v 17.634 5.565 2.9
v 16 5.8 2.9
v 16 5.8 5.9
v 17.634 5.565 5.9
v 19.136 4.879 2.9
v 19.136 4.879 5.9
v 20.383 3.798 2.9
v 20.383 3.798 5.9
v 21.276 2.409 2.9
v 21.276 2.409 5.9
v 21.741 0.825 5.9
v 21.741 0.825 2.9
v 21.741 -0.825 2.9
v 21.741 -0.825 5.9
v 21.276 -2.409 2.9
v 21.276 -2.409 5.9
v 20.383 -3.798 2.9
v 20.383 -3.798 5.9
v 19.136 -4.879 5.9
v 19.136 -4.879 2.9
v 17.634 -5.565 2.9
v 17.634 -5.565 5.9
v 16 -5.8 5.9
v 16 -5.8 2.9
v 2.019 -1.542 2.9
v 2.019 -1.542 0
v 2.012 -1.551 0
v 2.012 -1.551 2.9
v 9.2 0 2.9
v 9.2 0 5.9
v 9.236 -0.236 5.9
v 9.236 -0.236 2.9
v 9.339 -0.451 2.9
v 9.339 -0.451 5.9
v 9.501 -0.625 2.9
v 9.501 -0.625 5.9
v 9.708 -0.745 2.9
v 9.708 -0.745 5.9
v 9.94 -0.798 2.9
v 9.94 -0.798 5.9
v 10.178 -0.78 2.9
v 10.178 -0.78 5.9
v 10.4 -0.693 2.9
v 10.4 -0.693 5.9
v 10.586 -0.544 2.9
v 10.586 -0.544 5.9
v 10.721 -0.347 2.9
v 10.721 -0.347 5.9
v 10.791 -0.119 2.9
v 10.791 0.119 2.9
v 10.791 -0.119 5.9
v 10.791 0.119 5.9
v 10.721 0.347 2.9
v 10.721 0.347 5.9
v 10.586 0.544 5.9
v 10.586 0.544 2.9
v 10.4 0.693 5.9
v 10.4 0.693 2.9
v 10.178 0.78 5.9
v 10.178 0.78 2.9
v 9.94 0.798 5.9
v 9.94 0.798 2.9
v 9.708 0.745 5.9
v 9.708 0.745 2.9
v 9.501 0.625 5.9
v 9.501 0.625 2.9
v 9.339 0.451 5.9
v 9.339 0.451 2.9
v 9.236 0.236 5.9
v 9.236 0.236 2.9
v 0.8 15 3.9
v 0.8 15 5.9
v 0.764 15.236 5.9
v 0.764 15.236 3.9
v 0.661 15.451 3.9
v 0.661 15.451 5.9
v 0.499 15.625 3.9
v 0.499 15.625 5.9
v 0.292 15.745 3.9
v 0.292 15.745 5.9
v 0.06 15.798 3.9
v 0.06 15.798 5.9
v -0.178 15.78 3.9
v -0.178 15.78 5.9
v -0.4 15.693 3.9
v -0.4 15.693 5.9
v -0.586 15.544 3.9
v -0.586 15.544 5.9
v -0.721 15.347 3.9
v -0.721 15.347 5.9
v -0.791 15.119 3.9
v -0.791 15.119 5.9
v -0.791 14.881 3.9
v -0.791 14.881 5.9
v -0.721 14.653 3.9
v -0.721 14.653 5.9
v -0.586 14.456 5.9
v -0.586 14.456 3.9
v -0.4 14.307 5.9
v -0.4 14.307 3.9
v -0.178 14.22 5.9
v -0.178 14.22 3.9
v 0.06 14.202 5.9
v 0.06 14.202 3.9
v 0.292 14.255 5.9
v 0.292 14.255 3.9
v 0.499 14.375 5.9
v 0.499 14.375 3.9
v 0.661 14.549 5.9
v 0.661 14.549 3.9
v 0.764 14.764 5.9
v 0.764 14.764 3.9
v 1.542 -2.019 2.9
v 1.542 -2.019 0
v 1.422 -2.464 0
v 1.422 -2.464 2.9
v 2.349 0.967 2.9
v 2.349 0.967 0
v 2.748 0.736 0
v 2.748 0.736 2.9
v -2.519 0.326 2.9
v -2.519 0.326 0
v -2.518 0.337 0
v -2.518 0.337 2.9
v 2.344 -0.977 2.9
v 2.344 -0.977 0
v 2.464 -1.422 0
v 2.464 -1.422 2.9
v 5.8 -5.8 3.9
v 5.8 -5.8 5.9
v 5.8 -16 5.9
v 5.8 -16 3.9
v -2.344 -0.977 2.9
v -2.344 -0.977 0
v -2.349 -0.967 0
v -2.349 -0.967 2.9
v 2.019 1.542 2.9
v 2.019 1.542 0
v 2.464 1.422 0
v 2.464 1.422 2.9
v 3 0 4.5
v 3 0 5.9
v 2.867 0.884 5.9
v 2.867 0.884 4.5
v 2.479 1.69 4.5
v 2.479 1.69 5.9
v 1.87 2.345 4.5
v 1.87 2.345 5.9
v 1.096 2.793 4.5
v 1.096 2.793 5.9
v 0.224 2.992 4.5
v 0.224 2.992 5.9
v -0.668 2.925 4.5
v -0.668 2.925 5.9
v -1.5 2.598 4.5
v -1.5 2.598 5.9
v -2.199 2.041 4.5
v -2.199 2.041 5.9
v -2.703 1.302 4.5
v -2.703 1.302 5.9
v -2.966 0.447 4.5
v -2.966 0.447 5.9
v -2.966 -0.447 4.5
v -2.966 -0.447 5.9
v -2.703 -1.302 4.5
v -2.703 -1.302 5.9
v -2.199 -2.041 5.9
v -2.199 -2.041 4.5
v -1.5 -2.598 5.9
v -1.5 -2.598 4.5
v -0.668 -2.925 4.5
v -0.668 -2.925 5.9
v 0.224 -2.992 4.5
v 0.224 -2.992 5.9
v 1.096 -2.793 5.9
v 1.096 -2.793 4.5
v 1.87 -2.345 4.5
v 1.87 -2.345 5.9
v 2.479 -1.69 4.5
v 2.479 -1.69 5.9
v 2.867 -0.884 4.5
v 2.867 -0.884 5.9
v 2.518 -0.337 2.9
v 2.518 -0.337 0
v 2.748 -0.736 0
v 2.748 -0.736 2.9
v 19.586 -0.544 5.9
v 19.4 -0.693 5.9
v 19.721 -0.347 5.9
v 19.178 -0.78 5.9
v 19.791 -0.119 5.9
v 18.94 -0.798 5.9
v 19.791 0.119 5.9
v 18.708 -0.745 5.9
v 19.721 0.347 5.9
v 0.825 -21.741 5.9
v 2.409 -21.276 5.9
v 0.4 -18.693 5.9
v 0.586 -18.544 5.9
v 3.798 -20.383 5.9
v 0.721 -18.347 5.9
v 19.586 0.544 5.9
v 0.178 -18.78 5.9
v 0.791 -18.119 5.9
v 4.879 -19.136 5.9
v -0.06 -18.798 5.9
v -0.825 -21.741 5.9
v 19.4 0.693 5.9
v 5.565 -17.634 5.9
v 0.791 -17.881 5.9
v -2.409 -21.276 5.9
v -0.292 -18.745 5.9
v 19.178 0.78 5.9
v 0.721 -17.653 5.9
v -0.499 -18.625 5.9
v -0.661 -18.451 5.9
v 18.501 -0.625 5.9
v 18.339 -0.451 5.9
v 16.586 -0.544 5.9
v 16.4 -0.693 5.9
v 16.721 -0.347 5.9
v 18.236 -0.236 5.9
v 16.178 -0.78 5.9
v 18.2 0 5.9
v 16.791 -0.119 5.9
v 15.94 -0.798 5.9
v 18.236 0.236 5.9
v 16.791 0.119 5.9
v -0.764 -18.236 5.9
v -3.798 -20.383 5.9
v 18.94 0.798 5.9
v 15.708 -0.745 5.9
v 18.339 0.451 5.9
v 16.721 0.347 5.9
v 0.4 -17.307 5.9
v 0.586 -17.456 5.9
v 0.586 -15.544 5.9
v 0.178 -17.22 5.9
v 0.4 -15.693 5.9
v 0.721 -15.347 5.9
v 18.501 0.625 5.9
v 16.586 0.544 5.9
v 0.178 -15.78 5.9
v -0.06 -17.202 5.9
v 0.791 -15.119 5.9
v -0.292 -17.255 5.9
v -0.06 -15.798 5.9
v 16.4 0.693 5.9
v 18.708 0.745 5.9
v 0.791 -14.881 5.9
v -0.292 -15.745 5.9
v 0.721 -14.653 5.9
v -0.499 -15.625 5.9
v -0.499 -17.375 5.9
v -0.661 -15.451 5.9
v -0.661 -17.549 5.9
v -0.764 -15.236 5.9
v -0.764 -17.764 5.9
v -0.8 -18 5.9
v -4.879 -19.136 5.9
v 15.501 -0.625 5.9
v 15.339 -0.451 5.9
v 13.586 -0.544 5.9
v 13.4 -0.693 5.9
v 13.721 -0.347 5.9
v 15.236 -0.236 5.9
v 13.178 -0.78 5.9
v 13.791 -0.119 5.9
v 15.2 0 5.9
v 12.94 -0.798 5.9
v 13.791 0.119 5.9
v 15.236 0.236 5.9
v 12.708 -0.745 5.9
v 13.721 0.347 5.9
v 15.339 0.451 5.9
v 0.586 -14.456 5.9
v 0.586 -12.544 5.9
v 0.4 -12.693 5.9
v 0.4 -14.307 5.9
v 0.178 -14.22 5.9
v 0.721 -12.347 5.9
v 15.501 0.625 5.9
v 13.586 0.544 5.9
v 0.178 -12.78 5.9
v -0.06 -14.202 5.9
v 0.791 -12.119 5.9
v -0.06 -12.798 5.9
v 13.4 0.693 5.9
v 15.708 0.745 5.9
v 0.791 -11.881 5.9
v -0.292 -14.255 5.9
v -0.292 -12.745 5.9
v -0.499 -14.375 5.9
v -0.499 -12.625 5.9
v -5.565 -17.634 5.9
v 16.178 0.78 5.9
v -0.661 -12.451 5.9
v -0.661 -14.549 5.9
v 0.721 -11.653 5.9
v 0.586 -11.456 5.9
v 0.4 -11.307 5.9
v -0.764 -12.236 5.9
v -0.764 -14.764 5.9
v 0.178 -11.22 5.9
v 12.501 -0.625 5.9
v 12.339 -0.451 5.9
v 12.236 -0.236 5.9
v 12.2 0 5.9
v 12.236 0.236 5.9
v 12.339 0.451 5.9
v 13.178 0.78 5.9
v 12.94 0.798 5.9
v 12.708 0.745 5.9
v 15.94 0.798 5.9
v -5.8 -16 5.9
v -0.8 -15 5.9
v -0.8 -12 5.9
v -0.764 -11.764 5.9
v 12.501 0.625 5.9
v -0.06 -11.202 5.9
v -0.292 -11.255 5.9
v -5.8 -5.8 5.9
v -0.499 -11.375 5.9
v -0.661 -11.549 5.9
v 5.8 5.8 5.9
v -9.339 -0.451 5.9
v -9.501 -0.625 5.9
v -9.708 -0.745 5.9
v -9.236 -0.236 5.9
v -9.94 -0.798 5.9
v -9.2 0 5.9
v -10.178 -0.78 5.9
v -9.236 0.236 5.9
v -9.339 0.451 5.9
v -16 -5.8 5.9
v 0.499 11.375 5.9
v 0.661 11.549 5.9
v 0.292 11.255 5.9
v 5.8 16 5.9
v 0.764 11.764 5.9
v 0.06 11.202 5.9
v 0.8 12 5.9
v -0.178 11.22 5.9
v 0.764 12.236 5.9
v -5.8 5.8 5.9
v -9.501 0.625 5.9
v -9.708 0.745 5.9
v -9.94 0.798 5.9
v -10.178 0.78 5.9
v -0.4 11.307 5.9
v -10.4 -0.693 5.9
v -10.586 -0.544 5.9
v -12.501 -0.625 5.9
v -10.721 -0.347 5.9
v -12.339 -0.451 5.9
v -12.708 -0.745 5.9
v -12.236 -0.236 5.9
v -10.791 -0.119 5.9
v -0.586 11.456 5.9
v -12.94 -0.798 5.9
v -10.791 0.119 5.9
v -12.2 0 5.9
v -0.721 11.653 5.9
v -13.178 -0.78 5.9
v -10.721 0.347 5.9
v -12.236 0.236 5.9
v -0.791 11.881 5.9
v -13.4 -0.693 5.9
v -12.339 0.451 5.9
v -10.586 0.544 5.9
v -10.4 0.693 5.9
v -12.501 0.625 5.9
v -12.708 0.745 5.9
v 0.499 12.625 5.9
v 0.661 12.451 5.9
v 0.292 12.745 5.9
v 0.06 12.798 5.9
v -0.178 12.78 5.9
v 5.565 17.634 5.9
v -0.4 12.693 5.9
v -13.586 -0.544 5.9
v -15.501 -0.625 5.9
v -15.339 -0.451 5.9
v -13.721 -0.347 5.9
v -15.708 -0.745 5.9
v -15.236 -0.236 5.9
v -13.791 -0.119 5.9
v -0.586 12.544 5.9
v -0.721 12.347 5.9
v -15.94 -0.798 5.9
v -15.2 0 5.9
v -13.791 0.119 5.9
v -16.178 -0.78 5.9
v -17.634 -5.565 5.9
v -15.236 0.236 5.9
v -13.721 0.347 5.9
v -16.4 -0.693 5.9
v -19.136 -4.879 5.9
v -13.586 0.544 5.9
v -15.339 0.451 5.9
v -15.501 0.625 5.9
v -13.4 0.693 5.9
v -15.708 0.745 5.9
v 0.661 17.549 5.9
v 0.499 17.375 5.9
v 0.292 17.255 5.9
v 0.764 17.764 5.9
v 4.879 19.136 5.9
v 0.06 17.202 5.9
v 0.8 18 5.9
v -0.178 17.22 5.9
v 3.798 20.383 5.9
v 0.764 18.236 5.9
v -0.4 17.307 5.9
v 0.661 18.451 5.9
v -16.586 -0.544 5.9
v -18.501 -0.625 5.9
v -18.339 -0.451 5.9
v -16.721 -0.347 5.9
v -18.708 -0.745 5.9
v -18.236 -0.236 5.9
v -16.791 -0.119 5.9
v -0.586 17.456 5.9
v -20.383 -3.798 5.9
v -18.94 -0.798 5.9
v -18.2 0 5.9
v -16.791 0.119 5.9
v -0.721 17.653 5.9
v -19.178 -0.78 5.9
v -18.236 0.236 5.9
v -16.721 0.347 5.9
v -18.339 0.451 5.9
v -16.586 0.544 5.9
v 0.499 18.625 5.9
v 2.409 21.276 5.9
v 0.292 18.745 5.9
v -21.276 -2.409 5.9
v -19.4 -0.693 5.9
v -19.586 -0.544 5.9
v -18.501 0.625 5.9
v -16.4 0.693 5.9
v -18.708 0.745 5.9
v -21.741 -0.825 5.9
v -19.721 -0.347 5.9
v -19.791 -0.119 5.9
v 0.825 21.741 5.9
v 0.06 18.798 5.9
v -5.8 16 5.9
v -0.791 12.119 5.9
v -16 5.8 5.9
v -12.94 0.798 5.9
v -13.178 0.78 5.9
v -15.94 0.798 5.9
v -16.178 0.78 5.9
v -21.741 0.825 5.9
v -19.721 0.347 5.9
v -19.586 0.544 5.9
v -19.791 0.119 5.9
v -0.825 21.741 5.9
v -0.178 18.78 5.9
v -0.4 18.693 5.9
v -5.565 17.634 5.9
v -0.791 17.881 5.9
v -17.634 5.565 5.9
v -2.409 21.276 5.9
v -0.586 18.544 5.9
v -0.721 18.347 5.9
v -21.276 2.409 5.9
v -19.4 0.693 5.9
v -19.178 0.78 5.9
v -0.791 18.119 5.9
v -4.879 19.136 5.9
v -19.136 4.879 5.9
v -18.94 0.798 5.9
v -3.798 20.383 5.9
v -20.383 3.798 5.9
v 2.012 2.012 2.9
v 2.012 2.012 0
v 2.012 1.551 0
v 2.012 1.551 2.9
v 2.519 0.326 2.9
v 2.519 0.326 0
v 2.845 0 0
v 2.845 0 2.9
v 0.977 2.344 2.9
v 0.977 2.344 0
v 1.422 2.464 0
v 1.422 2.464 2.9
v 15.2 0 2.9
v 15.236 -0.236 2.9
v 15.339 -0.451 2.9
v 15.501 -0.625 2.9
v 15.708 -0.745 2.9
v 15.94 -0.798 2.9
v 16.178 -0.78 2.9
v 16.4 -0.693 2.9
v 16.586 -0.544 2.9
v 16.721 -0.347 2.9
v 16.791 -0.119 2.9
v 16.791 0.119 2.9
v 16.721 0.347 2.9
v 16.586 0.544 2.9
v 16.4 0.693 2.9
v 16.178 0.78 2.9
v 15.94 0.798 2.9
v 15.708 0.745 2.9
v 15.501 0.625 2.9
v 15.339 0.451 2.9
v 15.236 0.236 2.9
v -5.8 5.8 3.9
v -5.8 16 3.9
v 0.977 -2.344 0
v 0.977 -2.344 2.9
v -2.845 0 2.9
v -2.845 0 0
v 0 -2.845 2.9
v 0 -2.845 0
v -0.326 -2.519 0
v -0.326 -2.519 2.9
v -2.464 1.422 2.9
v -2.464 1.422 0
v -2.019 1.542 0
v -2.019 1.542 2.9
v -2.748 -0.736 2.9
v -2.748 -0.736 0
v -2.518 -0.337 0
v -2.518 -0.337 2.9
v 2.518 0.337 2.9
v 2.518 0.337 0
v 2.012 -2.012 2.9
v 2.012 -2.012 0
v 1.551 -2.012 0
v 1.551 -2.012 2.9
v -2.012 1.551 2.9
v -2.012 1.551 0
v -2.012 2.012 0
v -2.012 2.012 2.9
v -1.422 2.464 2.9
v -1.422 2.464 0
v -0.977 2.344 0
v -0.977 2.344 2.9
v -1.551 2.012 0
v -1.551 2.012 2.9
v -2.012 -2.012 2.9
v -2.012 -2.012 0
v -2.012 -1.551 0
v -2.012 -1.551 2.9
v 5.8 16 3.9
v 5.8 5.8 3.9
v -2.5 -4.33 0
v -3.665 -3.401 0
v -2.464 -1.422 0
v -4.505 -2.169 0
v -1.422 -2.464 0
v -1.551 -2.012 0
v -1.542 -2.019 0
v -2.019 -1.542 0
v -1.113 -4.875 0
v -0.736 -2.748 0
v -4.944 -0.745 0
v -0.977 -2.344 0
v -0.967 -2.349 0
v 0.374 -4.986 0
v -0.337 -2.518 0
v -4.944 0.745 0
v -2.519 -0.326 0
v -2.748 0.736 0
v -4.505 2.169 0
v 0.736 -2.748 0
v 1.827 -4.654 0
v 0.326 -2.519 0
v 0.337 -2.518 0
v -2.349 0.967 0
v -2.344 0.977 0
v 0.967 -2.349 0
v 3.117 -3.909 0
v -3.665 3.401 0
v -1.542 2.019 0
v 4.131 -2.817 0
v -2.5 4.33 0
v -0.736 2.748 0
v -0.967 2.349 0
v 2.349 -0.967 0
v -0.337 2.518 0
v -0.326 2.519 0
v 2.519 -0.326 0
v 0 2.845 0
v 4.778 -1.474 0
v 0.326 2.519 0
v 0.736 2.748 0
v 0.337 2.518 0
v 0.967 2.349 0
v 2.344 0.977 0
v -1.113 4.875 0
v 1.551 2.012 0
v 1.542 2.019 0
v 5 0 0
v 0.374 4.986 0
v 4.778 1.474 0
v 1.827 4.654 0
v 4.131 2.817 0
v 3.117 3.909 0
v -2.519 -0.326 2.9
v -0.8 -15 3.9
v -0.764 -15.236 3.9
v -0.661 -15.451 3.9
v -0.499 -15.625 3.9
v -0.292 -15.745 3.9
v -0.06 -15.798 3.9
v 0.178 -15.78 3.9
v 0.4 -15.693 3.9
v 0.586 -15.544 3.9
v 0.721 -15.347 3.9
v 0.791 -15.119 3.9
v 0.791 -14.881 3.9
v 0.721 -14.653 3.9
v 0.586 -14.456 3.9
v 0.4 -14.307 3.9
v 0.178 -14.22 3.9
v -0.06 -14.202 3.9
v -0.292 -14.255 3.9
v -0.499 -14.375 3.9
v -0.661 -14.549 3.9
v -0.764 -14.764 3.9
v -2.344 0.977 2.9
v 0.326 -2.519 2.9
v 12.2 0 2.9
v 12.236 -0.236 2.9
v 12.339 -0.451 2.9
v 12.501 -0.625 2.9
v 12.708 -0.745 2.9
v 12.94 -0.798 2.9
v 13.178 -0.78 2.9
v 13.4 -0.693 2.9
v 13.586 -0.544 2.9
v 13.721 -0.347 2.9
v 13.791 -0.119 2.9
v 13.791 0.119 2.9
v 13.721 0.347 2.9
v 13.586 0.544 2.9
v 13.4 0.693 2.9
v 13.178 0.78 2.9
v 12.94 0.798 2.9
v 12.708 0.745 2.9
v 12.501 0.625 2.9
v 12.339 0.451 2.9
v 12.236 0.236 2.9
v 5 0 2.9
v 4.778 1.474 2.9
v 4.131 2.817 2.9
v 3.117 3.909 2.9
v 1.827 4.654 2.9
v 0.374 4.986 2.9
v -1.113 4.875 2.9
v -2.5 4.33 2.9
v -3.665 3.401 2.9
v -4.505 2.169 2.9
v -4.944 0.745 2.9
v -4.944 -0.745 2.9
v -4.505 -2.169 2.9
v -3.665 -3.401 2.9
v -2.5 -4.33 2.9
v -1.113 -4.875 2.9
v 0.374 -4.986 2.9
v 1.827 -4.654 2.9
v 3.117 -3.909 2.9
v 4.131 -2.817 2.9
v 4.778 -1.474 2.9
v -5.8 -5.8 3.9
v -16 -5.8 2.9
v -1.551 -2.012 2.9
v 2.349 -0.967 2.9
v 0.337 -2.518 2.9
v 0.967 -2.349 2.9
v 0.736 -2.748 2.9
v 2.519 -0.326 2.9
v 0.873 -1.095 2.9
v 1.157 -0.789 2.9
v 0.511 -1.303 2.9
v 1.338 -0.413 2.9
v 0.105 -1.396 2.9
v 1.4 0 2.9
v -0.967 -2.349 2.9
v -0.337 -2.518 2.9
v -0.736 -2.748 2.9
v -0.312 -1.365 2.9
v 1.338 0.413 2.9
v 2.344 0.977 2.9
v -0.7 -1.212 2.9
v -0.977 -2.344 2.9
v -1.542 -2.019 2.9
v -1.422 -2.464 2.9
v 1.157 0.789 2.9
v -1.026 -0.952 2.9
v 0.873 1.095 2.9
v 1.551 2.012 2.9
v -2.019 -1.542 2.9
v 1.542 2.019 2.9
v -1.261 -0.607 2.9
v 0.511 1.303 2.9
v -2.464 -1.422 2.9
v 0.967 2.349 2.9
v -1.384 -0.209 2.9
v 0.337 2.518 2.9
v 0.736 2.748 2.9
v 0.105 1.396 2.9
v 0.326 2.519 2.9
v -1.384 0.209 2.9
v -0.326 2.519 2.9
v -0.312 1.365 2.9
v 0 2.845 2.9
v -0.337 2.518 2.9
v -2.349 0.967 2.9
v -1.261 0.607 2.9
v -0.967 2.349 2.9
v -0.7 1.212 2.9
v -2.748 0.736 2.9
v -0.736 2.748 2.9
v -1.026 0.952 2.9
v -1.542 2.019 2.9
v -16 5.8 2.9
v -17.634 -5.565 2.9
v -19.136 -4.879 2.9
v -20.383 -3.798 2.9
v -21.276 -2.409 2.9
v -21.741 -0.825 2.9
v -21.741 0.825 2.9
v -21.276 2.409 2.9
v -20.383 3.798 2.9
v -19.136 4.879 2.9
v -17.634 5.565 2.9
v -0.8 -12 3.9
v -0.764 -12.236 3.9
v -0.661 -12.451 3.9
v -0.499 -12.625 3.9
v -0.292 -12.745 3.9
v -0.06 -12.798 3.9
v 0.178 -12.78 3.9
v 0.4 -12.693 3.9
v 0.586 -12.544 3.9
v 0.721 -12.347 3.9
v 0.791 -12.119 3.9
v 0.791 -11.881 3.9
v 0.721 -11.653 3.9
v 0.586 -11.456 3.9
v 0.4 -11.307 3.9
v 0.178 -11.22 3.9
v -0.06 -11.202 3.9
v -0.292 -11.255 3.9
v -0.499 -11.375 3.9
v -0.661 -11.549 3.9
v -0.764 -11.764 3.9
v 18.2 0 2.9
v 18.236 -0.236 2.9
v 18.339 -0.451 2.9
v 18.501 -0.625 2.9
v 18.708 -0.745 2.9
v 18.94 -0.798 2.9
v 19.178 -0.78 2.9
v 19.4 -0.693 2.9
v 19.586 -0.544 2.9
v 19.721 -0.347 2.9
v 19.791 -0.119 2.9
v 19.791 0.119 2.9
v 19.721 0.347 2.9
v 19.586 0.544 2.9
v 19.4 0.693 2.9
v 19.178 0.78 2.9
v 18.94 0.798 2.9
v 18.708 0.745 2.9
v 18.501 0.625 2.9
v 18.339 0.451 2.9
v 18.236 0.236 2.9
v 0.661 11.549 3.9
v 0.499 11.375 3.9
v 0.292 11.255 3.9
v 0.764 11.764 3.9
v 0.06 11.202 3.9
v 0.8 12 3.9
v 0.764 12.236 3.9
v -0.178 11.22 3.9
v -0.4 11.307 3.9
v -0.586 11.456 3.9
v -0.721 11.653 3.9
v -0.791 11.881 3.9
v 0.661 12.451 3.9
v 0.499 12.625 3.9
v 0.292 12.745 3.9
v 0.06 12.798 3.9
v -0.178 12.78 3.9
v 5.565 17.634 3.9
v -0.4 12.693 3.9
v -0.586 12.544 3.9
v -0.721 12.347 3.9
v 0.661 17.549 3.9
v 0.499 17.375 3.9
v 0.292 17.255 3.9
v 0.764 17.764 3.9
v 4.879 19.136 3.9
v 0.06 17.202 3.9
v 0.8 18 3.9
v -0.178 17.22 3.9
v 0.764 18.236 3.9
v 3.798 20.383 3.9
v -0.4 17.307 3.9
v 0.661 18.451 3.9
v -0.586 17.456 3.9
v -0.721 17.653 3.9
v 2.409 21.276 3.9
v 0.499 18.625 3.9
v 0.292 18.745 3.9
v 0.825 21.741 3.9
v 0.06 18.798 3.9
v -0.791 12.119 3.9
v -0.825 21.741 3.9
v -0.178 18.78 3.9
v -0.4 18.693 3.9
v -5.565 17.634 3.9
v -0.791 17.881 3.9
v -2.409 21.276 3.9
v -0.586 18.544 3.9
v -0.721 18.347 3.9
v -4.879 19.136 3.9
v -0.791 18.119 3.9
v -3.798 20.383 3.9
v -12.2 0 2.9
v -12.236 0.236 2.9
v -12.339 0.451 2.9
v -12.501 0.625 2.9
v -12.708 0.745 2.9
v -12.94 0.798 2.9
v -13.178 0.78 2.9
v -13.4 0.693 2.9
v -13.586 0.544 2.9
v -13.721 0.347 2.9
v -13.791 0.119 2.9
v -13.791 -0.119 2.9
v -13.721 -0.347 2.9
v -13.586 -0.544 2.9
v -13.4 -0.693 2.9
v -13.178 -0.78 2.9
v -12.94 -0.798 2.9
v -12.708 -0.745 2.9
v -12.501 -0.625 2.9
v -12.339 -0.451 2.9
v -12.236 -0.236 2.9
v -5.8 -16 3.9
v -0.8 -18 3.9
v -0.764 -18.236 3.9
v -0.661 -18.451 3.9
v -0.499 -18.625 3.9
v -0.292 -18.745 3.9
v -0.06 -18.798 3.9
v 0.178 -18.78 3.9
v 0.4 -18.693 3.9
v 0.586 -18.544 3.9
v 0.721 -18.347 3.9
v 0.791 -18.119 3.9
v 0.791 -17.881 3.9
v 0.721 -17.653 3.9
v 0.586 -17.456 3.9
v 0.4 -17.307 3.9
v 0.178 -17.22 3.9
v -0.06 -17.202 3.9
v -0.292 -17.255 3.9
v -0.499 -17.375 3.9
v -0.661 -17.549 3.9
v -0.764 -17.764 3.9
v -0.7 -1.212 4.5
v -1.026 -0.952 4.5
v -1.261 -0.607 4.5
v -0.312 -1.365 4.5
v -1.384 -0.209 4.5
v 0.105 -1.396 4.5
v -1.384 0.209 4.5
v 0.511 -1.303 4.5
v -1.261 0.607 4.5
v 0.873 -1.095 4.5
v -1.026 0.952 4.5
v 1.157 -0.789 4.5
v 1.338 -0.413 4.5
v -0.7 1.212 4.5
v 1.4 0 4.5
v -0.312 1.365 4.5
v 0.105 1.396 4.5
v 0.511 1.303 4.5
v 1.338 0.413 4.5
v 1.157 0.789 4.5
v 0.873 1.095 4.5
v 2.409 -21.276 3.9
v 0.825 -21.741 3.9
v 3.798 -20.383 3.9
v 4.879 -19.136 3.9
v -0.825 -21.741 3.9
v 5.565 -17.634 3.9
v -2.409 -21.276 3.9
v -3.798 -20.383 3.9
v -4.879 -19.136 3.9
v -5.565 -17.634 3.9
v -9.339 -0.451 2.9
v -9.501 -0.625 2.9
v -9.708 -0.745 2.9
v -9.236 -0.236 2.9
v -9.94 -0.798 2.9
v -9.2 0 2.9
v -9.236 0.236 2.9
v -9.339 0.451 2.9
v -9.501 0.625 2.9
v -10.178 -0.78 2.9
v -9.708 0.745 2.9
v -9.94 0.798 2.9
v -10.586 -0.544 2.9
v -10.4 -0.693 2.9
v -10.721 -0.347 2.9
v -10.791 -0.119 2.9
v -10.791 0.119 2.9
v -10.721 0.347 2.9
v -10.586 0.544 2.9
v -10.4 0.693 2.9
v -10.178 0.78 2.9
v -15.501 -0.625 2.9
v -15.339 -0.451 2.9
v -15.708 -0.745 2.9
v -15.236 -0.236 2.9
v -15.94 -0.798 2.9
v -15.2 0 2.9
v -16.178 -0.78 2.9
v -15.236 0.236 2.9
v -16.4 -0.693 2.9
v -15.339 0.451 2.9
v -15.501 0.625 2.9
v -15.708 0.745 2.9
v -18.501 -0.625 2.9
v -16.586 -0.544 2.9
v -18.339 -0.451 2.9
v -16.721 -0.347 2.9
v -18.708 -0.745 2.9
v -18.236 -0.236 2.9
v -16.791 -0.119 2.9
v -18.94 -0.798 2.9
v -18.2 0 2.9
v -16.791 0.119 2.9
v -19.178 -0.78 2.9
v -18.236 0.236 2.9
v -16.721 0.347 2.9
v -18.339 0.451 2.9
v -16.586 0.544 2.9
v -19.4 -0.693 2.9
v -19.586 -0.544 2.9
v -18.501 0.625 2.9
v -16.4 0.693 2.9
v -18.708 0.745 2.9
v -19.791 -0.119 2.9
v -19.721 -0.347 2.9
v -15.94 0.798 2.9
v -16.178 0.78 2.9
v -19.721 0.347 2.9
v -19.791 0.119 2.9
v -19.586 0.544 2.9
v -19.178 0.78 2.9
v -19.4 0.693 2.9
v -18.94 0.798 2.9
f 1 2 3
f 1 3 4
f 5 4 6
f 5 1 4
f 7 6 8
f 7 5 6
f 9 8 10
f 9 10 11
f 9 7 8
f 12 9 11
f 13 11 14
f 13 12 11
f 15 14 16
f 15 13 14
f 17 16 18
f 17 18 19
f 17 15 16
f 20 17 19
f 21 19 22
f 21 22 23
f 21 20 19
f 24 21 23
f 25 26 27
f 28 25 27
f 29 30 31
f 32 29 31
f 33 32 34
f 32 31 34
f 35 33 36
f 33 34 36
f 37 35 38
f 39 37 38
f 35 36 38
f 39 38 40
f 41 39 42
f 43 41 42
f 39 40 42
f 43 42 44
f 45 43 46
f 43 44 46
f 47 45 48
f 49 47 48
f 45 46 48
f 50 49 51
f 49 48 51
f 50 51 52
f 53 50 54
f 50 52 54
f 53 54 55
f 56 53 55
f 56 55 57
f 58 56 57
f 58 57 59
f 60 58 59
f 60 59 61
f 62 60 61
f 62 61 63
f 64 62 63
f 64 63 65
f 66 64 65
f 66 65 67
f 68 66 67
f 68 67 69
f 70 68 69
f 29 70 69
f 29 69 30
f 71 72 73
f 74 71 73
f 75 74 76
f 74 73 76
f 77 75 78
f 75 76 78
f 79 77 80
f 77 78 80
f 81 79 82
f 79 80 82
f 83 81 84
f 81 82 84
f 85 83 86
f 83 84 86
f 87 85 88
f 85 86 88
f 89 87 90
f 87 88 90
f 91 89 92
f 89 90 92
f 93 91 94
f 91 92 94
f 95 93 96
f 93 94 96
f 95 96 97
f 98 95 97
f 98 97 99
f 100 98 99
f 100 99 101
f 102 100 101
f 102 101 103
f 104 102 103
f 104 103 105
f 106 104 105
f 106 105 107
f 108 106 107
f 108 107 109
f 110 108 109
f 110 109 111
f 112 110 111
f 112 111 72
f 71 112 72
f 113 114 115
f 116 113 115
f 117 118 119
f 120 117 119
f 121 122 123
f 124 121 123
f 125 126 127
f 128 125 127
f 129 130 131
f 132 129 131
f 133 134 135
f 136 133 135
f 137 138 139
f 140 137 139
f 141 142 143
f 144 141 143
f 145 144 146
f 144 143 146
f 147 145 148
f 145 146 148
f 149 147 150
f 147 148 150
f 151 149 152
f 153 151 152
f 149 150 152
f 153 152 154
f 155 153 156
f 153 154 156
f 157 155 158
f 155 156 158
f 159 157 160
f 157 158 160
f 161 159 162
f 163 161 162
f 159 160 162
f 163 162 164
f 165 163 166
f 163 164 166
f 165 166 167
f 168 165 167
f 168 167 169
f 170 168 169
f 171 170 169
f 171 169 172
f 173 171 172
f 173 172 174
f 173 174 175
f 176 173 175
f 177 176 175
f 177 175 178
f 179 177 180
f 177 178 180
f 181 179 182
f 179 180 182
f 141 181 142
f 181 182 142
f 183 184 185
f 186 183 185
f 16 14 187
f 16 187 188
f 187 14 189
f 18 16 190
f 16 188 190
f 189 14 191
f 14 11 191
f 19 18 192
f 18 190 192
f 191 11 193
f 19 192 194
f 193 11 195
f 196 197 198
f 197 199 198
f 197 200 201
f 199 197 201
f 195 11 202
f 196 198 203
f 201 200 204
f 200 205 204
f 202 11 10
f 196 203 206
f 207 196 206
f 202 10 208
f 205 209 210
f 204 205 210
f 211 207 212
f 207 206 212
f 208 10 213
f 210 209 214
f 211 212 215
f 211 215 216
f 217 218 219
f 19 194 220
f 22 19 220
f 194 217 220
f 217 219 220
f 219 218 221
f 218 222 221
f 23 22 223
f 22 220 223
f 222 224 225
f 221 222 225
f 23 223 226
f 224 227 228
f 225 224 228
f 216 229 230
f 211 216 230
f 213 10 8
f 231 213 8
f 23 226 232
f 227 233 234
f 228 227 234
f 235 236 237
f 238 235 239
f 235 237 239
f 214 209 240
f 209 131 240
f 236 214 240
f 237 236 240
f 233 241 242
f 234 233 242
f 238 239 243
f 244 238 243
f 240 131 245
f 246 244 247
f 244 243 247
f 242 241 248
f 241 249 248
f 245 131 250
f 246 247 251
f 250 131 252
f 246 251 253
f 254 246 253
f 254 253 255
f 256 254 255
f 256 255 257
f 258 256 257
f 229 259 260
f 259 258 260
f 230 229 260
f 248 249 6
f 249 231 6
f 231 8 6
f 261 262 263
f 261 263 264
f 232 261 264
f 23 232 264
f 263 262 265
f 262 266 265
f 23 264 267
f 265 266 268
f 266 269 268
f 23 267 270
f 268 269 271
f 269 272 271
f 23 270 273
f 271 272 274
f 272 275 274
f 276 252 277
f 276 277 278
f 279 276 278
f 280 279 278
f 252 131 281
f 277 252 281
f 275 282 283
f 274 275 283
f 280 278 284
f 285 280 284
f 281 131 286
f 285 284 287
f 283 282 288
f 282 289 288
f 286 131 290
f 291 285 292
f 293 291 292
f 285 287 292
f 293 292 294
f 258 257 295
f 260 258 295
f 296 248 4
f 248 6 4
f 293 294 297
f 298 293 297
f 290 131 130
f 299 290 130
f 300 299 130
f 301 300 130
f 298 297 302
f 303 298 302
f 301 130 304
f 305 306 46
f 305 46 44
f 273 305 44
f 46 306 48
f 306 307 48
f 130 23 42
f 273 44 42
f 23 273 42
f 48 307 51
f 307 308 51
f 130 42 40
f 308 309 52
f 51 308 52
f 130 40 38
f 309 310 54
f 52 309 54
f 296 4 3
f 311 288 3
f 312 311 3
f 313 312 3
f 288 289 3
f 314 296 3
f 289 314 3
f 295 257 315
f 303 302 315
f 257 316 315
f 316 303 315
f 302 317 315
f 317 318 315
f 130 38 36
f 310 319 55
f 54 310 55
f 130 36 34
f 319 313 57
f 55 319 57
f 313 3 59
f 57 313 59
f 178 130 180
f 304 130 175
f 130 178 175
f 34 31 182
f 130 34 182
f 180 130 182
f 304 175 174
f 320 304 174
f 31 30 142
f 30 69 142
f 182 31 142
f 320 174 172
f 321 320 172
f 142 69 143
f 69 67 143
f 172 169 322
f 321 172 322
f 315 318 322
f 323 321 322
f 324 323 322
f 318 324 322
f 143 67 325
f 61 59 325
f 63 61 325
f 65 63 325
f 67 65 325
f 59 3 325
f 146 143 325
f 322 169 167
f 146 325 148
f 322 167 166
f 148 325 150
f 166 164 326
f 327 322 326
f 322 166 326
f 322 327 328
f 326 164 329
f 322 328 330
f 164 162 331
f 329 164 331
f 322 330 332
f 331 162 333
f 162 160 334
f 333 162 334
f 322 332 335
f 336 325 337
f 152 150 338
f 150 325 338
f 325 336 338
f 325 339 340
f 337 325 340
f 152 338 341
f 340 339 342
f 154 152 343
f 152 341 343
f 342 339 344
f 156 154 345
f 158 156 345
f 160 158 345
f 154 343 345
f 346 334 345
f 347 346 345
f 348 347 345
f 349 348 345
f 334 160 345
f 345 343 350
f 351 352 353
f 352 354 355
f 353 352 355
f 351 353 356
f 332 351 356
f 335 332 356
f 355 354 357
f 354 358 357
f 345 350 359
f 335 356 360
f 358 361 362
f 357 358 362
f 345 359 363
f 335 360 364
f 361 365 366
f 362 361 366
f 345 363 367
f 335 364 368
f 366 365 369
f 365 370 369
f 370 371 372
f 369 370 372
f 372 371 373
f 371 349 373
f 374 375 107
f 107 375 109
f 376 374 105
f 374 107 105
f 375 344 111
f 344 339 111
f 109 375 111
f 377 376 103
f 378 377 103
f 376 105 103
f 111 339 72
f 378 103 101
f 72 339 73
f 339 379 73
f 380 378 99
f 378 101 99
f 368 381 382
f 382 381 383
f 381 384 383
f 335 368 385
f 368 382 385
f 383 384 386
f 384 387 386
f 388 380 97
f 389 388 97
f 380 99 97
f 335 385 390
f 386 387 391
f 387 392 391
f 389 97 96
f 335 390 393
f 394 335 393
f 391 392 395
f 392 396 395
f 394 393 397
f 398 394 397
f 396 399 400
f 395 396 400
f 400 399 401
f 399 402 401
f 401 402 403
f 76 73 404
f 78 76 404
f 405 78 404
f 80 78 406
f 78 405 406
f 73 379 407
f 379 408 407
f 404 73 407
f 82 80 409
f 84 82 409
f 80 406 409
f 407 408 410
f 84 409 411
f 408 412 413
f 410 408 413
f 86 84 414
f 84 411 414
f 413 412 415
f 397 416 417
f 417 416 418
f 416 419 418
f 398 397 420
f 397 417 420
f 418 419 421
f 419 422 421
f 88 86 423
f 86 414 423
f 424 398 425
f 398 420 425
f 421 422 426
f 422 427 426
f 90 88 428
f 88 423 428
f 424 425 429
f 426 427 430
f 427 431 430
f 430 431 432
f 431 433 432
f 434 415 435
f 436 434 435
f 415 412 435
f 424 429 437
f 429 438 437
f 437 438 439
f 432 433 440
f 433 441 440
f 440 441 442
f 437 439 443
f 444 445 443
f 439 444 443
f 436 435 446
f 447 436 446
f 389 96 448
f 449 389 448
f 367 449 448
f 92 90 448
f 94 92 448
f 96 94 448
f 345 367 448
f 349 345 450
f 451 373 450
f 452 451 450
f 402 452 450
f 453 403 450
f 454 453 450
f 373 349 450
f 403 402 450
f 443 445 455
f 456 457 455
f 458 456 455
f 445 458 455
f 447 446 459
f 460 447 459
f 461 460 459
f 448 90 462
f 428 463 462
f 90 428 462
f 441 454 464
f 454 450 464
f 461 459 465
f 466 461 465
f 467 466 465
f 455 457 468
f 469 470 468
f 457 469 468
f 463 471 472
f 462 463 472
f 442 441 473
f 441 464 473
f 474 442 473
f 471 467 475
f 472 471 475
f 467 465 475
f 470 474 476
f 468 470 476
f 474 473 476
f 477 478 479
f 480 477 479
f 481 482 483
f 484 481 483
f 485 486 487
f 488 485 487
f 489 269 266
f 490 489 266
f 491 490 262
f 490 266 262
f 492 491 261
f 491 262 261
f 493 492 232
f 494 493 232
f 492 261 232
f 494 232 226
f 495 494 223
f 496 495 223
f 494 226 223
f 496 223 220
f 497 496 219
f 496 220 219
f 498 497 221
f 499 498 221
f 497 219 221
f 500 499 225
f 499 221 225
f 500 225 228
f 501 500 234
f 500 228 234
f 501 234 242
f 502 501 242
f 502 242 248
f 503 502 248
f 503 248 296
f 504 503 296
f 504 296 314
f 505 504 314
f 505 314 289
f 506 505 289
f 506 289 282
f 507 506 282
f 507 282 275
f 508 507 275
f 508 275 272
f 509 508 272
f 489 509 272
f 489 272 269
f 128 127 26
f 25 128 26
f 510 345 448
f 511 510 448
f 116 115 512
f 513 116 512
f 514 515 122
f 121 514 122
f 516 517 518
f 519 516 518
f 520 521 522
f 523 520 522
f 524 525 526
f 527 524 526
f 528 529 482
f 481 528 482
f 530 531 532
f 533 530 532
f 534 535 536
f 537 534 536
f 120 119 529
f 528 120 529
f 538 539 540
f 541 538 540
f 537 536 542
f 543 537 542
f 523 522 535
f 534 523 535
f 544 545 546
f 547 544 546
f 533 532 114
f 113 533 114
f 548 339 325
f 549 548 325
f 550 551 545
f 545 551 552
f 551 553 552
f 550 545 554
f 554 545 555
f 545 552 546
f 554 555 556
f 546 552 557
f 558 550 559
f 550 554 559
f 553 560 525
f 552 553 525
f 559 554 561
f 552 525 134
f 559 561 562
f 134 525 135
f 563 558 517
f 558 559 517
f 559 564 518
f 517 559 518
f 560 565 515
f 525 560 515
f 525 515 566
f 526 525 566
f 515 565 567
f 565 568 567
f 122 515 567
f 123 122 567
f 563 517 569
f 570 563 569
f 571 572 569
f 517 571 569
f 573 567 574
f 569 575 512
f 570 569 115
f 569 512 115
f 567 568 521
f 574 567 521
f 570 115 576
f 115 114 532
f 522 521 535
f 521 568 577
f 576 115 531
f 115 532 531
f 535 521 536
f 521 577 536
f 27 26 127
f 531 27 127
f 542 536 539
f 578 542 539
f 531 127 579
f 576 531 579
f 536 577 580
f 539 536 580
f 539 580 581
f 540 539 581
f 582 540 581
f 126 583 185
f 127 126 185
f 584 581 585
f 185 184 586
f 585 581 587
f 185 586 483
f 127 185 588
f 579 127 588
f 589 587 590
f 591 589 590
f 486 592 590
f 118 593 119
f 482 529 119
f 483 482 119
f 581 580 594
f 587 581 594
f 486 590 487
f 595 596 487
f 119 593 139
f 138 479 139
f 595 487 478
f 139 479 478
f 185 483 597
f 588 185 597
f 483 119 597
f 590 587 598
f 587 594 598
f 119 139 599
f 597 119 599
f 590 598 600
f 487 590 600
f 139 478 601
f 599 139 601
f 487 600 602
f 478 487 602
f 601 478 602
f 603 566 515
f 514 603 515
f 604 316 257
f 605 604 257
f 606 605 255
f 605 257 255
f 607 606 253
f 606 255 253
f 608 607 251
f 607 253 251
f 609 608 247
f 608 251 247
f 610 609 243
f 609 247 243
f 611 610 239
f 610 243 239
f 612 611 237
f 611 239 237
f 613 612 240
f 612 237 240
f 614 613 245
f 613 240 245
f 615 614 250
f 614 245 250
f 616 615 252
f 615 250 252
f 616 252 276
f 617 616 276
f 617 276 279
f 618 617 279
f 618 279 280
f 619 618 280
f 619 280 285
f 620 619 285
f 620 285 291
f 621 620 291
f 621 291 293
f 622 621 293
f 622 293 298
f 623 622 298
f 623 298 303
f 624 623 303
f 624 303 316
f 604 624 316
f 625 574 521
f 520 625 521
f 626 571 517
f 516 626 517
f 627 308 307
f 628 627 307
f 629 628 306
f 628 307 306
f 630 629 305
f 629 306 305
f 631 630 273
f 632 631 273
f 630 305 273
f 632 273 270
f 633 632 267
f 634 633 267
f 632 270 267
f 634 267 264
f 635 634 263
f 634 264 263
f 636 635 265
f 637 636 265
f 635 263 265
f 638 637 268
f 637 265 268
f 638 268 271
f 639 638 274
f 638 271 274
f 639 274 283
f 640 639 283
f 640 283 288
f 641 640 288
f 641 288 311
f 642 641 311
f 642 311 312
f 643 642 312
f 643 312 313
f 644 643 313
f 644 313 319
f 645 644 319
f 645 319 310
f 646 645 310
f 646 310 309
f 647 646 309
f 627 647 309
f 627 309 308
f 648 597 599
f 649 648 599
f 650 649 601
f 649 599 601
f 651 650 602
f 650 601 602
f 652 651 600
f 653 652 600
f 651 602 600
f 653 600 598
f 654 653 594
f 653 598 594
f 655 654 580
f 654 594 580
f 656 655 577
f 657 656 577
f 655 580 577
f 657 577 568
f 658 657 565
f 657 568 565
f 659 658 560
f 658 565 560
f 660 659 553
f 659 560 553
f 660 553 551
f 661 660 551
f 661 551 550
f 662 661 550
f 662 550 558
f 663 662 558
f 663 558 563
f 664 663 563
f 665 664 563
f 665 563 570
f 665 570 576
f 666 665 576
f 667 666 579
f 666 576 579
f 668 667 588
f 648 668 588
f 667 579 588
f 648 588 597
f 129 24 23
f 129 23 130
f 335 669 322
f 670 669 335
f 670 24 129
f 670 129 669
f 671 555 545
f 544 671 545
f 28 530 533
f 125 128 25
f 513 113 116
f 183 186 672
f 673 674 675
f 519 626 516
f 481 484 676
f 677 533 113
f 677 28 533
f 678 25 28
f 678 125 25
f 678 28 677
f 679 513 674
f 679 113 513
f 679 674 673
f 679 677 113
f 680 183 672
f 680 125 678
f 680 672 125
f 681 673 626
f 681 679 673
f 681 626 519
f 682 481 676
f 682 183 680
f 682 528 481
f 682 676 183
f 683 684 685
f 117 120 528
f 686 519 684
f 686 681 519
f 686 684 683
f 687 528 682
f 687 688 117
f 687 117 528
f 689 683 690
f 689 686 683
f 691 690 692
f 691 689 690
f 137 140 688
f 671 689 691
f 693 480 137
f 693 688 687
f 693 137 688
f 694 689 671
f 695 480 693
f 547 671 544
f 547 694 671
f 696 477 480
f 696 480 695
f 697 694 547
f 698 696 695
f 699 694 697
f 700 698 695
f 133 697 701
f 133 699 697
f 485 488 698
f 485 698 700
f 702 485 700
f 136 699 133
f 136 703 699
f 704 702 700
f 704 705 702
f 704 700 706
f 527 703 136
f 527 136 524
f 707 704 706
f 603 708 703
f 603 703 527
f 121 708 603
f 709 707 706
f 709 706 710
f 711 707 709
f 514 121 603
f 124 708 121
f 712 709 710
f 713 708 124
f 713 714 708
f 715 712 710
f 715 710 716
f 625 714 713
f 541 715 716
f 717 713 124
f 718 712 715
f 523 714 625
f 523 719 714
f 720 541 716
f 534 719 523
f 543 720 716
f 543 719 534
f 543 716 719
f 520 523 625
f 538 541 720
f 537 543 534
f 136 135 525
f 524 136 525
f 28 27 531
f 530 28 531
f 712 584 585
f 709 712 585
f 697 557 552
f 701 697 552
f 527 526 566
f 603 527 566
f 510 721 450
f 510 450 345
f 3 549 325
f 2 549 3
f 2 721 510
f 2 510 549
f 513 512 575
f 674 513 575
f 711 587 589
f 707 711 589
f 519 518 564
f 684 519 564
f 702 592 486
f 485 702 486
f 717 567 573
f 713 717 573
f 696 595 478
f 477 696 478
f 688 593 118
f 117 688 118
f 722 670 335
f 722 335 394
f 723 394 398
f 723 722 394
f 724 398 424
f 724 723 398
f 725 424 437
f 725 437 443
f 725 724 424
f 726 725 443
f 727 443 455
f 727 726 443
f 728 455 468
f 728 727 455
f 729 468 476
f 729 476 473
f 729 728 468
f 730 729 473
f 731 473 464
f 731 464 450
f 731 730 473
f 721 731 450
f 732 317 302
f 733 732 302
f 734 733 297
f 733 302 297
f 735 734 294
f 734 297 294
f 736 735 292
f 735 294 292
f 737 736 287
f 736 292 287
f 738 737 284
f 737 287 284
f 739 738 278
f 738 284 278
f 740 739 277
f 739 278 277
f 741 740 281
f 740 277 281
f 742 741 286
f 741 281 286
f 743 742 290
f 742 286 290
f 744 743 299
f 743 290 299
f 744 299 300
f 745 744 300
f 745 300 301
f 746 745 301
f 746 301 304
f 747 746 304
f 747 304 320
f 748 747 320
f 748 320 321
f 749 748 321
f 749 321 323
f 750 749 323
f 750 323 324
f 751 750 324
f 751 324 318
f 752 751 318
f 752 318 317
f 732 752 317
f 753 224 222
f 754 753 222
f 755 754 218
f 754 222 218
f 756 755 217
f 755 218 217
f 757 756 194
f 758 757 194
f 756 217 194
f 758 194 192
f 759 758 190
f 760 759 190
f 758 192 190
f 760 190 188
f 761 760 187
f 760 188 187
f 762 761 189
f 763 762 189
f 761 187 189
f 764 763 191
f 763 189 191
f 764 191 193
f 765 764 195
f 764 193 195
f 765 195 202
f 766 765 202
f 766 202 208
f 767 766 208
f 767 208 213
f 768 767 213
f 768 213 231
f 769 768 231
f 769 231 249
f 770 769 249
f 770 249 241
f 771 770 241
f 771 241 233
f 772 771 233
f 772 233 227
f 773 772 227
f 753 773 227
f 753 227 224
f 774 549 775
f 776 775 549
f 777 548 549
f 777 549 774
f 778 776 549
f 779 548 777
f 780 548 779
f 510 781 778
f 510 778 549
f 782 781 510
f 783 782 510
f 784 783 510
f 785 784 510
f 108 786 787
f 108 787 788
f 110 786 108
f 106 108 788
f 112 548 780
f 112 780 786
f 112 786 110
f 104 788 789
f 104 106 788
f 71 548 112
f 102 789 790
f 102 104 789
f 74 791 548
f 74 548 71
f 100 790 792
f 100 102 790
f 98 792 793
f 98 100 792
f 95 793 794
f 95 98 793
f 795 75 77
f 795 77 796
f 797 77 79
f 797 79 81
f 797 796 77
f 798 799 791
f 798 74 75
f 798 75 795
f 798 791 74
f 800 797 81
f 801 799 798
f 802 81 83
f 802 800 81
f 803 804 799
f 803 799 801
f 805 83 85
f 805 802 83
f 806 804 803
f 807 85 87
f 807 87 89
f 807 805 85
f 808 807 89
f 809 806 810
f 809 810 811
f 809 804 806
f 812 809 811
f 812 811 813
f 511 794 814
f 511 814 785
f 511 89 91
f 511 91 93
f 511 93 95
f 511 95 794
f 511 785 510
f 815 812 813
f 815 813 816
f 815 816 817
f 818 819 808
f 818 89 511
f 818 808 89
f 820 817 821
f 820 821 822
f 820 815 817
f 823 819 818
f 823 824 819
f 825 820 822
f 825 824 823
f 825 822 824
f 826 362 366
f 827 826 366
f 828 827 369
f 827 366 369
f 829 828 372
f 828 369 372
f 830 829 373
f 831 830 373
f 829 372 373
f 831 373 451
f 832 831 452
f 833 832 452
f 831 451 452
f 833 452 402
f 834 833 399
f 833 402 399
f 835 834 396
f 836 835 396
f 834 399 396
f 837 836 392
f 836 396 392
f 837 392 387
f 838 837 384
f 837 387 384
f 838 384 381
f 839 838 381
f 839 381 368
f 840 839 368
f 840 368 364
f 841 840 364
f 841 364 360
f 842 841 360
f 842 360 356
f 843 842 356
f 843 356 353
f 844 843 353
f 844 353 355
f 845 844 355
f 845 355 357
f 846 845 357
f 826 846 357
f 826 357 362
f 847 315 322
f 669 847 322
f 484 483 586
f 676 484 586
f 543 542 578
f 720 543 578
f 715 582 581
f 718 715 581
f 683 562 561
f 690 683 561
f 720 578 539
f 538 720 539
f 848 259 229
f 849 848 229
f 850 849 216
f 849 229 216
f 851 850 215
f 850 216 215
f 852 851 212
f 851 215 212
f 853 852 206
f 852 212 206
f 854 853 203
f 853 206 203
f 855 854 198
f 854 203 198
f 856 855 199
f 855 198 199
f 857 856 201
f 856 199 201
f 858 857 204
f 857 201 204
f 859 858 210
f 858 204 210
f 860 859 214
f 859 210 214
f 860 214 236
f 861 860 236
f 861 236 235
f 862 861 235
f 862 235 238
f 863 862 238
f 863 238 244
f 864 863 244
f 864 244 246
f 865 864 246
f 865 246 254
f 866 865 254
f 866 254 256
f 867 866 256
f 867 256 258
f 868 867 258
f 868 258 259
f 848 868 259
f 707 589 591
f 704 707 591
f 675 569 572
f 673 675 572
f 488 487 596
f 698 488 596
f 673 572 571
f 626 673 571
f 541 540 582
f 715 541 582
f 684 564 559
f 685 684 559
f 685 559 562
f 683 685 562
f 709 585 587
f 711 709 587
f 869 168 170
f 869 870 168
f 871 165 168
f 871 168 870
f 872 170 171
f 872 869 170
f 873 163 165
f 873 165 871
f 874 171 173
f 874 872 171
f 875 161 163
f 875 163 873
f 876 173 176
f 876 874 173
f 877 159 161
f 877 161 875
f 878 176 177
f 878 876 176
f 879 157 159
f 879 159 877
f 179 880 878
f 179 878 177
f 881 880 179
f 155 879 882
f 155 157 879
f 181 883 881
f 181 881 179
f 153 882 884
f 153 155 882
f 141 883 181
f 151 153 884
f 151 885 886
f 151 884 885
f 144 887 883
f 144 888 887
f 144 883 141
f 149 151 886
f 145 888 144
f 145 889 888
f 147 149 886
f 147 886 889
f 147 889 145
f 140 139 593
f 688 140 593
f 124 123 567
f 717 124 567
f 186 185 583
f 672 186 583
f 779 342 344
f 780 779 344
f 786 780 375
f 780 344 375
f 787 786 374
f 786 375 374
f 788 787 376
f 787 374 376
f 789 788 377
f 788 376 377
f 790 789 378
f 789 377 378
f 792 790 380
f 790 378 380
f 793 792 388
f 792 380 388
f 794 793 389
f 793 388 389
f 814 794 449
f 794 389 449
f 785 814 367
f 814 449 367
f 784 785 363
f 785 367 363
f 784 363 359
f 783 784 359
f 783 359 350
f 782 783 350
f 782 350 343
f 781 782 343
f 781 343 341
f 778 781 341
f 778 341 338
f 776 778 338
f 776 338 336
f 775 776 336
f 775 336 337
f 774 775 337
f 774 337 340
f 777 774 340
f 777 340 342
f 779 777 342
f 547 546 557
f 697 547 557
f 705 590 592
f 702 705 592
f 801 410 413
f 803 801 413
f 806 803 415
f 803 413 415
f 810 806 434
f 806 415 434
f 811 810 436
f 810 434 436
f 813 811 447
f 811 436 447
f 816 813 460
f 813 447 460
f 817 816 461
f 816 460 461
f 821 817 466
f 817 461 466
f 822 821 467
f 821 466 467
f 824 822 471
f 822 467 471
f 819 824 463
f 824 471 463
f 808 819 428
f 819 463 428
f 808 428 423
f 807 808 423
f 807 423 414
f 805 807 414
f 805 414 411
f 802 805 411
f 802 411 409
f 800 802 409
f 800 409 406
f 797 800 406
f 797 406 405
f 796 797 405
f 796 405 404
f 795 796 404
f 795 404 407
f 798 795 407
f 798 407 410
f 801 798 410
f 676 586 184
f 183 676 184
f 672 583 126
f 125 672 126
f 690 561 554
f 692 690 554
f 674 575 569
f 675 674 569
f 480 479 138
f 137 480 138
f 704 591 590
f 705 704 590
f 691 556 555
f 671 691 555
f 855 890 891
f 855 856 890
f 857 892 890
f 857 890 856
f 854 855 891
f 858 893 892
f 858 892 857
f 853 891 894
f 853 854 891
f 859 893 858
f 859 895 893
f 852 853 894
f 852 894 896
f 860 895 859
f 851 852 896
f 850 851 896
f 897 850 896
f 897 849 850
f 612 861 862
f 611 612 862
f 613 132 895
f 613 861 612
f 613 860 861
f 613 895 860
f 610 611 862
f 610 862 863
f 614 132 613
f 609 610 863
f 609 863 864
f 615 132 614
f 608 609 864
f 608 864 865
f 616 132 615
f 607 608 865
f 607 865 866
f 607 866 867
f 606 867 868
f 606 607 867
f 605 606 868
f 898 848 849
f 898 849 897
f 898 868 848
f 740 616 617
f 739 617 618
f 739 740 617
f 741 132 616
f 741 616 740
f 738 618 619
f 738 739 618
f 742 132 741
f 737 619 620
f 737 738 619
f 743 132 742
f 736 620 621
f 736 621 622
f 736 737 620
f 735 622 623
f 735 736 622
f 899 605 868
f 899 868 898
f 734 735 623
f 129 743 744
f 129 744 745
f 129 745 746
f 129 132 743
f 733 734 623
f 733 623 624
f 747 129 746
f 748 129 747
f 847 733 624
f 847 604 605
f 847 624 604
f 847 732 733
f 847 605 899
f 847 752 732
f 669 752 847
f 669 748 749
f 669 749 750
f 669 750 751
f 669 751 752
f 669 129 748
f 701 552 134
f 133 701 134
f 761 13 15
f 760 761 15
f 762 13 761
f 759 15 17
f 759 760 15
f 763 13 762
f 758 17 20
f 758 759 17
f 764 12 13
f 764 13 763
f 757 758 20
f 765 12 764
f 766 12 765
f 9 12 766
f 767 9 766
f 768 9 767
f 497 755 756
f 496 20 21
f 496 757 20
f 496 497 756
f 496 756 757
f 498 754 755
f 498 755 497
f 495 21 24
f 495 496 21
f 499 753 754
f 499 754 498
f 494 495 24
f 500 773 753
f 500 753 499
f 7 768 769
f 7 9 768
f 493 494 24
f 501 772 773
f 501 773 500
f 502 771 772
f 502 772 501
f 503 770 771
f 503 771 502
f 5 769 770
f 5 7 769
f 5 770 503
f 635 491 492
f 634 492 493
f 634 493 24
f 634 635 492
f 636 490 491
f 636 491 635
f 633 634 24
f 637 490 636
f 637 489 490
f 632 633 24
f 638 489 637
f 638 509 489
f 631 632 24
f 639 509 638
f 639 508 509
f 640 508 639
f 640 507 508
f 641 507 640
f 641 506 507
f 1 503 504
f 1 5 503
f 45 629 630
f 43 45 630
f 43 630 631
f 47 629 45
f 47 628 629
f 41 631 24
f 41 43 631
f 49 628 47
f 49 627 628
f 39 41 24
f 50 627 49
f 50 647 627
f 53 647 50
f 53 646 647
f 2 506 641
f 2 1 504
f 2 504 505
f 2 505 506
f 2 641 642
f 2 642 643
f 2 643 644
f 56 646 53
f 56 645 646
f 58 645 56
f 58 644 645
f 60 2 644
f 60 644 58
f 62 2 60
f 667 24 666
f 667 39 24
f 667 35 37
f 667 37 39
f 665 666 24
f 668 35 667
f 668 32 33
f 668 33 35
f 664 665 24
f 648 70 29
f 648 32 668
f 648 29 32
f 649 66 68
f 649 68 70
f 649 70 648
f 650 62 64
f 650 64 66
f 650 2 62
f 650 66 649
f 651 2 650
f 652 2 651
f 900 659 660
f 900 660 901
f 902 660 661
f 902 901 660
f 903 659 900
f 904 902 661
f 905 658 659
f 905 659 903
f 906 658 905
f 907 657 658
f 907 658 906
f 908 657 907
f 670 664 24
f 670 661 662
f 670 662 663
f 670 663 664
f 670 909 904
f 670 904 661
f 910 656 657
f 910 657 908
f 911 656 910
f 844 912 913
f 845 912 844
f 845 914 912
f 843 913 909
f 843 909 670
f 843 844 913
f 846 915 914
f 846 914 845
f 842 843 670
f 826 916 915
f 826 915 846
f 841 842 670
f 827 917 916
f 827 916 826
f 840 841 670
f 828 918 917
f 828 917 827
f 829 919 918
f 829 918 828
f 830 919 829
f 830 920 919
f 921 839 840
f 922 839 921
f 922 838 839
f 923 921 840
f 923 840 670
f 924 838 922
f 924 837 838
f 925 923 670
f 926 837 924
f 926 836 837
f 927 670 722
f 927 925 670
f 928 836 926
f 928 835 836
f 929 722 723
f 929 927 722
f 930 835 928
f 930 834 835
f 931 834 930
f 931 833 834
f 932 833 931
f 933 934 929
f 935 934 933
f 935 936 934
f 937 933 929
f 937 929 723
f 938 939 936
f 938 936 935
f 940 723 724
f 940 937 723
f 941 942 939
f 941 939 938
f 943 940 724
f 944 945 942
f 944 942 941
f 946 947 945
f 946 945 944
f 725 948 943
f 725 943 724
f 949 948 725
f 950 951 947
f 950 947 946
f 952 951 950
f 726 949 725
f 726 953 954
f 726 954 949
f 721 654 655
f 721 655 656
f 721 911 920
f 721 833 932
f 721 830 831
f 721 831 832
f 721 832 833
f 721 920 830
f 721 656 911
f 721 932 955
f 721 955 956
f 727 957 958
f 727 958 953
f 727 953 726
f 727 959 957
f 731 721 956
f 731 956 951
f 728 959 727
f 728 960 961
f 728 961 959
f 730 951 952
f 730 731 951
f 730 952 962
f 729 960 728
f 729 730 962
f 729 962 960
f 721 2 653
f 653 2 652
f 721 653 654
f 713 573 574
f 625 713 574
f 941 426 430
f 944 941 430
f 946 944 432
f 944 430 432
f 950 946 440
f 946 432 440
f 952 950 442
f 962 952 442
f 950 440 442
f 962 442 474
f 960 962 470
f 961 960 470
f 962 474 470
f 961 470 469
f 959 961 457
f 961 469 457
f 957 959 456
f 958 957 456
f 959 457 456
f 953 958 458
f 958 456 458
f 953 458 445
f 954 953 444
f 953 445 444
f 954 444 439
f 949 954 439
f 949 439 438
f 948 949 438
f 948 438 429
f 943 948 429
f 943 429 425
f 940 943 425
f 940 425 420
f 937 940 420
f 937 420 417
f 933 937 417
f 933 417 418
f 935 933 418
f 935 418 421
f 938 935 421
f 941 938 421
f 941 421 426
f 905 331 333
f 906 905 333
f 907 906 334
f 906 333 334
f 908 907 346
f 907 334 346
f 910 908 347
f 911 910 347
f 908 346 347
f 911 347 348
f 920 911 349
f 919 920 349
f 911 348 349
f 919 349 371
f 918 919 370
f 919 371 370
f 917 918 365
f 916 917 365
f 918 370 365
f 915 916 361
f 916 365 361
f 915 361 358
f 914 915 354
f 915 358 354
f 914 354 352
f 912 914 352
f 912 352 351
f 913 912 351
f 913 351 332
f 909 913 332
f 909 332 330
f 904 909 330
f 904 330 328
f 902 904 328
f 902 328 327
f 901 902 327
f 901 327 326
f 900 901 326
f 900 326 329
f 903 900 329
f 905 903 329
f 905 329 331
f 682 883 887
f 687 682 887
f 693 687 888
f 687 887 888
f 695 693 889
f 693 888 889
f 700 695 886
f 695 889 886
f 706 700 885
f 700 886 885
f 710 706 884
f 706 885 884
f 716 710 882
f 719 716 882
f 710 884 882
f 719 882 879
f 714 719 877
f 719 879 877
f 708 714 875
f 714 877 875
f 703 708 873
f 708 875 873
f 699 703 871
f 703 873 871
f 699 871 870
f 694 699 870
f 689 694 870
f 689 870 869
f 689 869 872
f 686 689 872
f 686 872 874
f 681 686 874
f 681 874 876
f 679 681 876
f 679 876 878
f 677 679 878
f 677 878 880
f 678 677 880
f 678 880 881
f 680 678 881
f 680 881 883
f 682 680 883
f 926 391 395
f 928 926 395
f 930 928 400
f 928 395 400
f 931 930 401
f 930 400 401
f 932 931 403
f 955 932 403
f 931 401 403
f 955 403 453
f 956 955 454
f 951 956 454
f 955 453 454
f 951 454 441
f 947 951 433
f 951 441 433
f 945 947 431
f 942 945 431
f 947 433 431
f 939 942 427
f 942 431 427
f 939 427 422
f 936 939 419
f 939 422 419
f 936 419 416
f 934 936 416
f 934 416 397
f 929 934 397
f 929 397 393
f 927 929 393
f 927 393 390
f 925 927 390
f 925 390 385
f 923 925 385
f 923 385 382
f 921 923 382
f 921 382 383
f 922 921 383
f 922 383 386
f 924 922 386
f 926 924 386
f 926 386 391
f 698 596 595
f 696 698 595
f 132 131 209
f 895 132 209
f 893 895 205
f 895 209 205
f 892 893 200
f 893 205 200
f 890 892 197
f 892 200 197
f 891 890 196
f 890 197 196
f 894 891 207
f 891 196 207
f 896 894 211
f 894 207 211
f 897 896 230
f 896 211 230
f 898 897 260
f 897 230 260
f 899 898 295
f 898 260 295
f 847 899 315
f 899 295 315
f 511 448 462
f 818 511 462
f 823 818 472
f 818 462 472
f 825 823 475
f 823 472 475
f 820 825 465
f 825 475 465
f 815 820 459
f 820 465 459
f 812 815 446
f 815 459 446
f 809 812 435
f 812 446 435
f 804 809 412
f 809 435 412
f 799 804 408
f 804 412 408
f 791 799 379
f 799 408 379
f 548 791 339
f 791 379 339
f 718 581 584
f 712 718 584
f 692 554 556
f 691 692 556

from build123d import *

# Parameters (mm, degrees)
ESQUISSE1_R                  = 5
BOSS_EXTRU_1_DEPTH           = 2.9
BOSS_EXTRU_2_DEPTH           = 3
BOSS_EXTRU_3_DEPTH           = 2
ESQUISSE4_R                  = 0.8
ENL_V_MAT_EXTRU_1_DEPTH      = 6.9
ESQUISSE5_R                  = 0.8
ENL_V_MAT_EXTRU_2_DEPTH      = 6.9
R_P_TITION_CIRCULAIRE1_COUNT = 2
ESQUISSE6_R                  = 3
ENL_V_MAT_EXTRU_3_DEPTH      = 1.4
ESQUISSE7_R                  = 1.4
ENL_V_MAT_EXTRU_4_DEPTH      = 5.5


with BuildPart() as part:
    # Esquisse1 → Boss.-Extru.1 (new body)
    with BuildSketch(Plane.XY):
        Circle(ESQUISSE1_R)
        Polygon((2.011577371, -1.550856692), (2.011577371, -2.011577371), (1.550856692, -2.011577371), (1.541643286, -2.018647066), (1.4224, -2.463669069), (0.977377998, -2.344425783), (0.966648759, -2.348869979), (0.73628842, -2.747865791), (0.337292608, -2.517505451), (0.325778716, -2.519021284), (0, -2.8448), (-0.325778716, -2.519021284), (-0.337292608, -2.517505451), (-0.73628842, -2.747865791), (-0.966648759, -2.348869979), (-0.977377998, -2.344425783), (-1.4224, -2.463669069), (-1.541643286, -2.018647066), (-1.550856692, -2.011577371), (-2.011577371, -2.011577371), (-2.011577371, -1.550856692), (-2.018647066, -1.541643286), (-2.463669069, -1.4224), (-2.344425783, -0.977377998), (-2.348869979, -0.966648759), (-2.747865791, -0.73628842), (-2.517505451, -0.337292608), (-2.519021284, -0.325778716), (-2.8448, 0), (-2.519021284, 0.325778716), (-2.517505451, 0.337292608), (-2.747865791, 0.73628842), (-2.348869979, 0.966648759), (-2.344425783, 0.977377998), (-2.463669069, 1.4224), (-2.018647066, 1.541643286), (-2.011577371, 1.550856692), (-2.011577371, 2.011577371), (-1.550856692, 2.011577371), (-1.541643286, 2.018647066), (-1.4224, 2.463669069), (-0.977377998, 2.344425783), (-0.966648759, 2.348869979), (-0.73628842, 2.747865791), (-0.337292608, 2.517505451), (-0.325778716, 2.519021284), (0, 2.8448), (0.325778716, 2.519021284), (0.337292608, 2.517505451), (0.73628842, 2.747865791), (0.966648759, 2.348869979), (0.977377998, 2.344425783), (1.4224, 2.463669069), (1.541643286, 2.018647066), (1.550856692, 2.011577371), (2.011577371, 2.011577371), (2.011577371, 1.550856692), (2.018647066, 1.541643286), (2.463669069, 1.4224), (2.344425783, 0.977377998), (2.348869979, 0.966648759), (2.747865791, 0.73628842), (2.517505451, 0.337292608), (2.519021284, 0.325778716), (2.8448, 0), (2.519021284, -0.325778716), (2.517505451, -0.337292608), (2.747865791, -0.73628842), (2.348869979, -0.966648759), (2.344425783, -0.977377998), (2.463669069, -1.4224), (2.018647066, -1.541643286), align=None, mode=Mode.SUBTRACT)
    extrude(amount=BOSS_EXTRU_1_DEPTH)

    # Esquisse2 → Boss.-Extru.2 (add)
    with BuildSketch(Plane.XY.offset(2.9)):
        with BuildLine():
            Line((-16, 5.8), (16, 5.8))
            ThreePointArc((16, 5.8), (21.8, 0), (16, -5.8))
            Line((16, -5.8), (-16, -5.8))
            ThreePointArc((-16, -5.8), (-21.8, 0), (-16, 5.8))
        make_face()
    extrude(amount=BOSS_EXTRU_2_DEPTH)

    # Esquisse3 → Boss.-Extru.3 (add)
    with BuildSketch(Plane.XY.offset(5.9)):
        with BuildLine():
            Line((5.8, 16), (5.8, -16))
            ThreePointArc((5.8, -16), (0, -21.8), (-5.8, -16))
            Line((-5.8, -16), (-5.8, 16))
            ThreePointArc((-5.8, 16), (0, 21.8), (5.8, 16))
        make_face()
    extrude(amount=-BOSS_EXTRU_3_DEPTH)

    # Esquisse4 → Enlèv. mat.-Extru.1 (cut, through all)
    with BuildSketch(Plane.XY.offset(5.9)):
        with Locations((-10, 0)):
            Circle(ESQUISSE4_R)
        with Locations((-13, 0)):
            Circle(ESQUISSE4_R)
        with Locations((-16, 0)):
            Circle(ESQUISSE4_R)
        with Locations((-19, 0)):
            Circle(ESQUISSE4_R)
    enl_v_mat_extru_1 = extrude(amount=-ENL_V_MAT_EXTRU_1_DEPTH, mode=Mode.SUBTRACT)

    # Esquisse5 → Enlèv. mat.-Extru.2 (cut, through all)
    with BuildSketch(Plane.XY.offset(5.9)):
        with Locations((0, 12)):
            Circle(ESQUISSE5_R)
        with Locations((0, 15)):
            Circle(ESQUISSE5_R)
        with Locations((0, 18)):
            Circle(ESQUISSE5_R)
    enl_v_mat_extru_2 = extrude(amount=-ENL_V_MAT_EXTRU_2_DEPTH, mode=Mode.SUBTRACT)

    # Répétition circulaire1: Enlèv. mat.-Extru.1, Enlèv. mat.-Extru.2 ×2 about axis
    r_p_tition_circulaire1_axis = Axis((0, 0, 0), (0, 0, 1))
    for i in range(1, R_P_TITION_CIRCULAIRE1_COUNT):
        add(enl_v_mat_extru_1.rotate(r_p_tition_circulaire1_axis, i * 360 / R_P_TITION_CIRCULAIRE1_COUNT), mode=Mode.SUBTRACT)
        add(enl_v_mat_extru_2.rotate(r_p_tition_circulaire1_axis, i * 360 / R_P_TITION_CIRCULAIRE1_COUNT), mode=Mode.SUBTRACT)

    # Esquisse6 → Enlèv. mat.-Extru.3 (cut)
    with BuildSketch(Plane.XY.offset(5.9)):
        Circle(ESQUISSE6_R)
    extrude(amount=-ENL_V_MAT_EXTRU_3_DEPTH, mode=Mode.SUBTRACT)

    # Esquisse7 → Enlèv. mat.-Extru.4 (cut, through all)
    with BuildSketch(Plane.XY.offset(4.5)):
        Circle(ESQUISSE7_R)
    extrude(amount=-ENL_V_MAT_EXTRU_4_DEPTH, mode=Mode.SUBTRACT)


solid = part.part
